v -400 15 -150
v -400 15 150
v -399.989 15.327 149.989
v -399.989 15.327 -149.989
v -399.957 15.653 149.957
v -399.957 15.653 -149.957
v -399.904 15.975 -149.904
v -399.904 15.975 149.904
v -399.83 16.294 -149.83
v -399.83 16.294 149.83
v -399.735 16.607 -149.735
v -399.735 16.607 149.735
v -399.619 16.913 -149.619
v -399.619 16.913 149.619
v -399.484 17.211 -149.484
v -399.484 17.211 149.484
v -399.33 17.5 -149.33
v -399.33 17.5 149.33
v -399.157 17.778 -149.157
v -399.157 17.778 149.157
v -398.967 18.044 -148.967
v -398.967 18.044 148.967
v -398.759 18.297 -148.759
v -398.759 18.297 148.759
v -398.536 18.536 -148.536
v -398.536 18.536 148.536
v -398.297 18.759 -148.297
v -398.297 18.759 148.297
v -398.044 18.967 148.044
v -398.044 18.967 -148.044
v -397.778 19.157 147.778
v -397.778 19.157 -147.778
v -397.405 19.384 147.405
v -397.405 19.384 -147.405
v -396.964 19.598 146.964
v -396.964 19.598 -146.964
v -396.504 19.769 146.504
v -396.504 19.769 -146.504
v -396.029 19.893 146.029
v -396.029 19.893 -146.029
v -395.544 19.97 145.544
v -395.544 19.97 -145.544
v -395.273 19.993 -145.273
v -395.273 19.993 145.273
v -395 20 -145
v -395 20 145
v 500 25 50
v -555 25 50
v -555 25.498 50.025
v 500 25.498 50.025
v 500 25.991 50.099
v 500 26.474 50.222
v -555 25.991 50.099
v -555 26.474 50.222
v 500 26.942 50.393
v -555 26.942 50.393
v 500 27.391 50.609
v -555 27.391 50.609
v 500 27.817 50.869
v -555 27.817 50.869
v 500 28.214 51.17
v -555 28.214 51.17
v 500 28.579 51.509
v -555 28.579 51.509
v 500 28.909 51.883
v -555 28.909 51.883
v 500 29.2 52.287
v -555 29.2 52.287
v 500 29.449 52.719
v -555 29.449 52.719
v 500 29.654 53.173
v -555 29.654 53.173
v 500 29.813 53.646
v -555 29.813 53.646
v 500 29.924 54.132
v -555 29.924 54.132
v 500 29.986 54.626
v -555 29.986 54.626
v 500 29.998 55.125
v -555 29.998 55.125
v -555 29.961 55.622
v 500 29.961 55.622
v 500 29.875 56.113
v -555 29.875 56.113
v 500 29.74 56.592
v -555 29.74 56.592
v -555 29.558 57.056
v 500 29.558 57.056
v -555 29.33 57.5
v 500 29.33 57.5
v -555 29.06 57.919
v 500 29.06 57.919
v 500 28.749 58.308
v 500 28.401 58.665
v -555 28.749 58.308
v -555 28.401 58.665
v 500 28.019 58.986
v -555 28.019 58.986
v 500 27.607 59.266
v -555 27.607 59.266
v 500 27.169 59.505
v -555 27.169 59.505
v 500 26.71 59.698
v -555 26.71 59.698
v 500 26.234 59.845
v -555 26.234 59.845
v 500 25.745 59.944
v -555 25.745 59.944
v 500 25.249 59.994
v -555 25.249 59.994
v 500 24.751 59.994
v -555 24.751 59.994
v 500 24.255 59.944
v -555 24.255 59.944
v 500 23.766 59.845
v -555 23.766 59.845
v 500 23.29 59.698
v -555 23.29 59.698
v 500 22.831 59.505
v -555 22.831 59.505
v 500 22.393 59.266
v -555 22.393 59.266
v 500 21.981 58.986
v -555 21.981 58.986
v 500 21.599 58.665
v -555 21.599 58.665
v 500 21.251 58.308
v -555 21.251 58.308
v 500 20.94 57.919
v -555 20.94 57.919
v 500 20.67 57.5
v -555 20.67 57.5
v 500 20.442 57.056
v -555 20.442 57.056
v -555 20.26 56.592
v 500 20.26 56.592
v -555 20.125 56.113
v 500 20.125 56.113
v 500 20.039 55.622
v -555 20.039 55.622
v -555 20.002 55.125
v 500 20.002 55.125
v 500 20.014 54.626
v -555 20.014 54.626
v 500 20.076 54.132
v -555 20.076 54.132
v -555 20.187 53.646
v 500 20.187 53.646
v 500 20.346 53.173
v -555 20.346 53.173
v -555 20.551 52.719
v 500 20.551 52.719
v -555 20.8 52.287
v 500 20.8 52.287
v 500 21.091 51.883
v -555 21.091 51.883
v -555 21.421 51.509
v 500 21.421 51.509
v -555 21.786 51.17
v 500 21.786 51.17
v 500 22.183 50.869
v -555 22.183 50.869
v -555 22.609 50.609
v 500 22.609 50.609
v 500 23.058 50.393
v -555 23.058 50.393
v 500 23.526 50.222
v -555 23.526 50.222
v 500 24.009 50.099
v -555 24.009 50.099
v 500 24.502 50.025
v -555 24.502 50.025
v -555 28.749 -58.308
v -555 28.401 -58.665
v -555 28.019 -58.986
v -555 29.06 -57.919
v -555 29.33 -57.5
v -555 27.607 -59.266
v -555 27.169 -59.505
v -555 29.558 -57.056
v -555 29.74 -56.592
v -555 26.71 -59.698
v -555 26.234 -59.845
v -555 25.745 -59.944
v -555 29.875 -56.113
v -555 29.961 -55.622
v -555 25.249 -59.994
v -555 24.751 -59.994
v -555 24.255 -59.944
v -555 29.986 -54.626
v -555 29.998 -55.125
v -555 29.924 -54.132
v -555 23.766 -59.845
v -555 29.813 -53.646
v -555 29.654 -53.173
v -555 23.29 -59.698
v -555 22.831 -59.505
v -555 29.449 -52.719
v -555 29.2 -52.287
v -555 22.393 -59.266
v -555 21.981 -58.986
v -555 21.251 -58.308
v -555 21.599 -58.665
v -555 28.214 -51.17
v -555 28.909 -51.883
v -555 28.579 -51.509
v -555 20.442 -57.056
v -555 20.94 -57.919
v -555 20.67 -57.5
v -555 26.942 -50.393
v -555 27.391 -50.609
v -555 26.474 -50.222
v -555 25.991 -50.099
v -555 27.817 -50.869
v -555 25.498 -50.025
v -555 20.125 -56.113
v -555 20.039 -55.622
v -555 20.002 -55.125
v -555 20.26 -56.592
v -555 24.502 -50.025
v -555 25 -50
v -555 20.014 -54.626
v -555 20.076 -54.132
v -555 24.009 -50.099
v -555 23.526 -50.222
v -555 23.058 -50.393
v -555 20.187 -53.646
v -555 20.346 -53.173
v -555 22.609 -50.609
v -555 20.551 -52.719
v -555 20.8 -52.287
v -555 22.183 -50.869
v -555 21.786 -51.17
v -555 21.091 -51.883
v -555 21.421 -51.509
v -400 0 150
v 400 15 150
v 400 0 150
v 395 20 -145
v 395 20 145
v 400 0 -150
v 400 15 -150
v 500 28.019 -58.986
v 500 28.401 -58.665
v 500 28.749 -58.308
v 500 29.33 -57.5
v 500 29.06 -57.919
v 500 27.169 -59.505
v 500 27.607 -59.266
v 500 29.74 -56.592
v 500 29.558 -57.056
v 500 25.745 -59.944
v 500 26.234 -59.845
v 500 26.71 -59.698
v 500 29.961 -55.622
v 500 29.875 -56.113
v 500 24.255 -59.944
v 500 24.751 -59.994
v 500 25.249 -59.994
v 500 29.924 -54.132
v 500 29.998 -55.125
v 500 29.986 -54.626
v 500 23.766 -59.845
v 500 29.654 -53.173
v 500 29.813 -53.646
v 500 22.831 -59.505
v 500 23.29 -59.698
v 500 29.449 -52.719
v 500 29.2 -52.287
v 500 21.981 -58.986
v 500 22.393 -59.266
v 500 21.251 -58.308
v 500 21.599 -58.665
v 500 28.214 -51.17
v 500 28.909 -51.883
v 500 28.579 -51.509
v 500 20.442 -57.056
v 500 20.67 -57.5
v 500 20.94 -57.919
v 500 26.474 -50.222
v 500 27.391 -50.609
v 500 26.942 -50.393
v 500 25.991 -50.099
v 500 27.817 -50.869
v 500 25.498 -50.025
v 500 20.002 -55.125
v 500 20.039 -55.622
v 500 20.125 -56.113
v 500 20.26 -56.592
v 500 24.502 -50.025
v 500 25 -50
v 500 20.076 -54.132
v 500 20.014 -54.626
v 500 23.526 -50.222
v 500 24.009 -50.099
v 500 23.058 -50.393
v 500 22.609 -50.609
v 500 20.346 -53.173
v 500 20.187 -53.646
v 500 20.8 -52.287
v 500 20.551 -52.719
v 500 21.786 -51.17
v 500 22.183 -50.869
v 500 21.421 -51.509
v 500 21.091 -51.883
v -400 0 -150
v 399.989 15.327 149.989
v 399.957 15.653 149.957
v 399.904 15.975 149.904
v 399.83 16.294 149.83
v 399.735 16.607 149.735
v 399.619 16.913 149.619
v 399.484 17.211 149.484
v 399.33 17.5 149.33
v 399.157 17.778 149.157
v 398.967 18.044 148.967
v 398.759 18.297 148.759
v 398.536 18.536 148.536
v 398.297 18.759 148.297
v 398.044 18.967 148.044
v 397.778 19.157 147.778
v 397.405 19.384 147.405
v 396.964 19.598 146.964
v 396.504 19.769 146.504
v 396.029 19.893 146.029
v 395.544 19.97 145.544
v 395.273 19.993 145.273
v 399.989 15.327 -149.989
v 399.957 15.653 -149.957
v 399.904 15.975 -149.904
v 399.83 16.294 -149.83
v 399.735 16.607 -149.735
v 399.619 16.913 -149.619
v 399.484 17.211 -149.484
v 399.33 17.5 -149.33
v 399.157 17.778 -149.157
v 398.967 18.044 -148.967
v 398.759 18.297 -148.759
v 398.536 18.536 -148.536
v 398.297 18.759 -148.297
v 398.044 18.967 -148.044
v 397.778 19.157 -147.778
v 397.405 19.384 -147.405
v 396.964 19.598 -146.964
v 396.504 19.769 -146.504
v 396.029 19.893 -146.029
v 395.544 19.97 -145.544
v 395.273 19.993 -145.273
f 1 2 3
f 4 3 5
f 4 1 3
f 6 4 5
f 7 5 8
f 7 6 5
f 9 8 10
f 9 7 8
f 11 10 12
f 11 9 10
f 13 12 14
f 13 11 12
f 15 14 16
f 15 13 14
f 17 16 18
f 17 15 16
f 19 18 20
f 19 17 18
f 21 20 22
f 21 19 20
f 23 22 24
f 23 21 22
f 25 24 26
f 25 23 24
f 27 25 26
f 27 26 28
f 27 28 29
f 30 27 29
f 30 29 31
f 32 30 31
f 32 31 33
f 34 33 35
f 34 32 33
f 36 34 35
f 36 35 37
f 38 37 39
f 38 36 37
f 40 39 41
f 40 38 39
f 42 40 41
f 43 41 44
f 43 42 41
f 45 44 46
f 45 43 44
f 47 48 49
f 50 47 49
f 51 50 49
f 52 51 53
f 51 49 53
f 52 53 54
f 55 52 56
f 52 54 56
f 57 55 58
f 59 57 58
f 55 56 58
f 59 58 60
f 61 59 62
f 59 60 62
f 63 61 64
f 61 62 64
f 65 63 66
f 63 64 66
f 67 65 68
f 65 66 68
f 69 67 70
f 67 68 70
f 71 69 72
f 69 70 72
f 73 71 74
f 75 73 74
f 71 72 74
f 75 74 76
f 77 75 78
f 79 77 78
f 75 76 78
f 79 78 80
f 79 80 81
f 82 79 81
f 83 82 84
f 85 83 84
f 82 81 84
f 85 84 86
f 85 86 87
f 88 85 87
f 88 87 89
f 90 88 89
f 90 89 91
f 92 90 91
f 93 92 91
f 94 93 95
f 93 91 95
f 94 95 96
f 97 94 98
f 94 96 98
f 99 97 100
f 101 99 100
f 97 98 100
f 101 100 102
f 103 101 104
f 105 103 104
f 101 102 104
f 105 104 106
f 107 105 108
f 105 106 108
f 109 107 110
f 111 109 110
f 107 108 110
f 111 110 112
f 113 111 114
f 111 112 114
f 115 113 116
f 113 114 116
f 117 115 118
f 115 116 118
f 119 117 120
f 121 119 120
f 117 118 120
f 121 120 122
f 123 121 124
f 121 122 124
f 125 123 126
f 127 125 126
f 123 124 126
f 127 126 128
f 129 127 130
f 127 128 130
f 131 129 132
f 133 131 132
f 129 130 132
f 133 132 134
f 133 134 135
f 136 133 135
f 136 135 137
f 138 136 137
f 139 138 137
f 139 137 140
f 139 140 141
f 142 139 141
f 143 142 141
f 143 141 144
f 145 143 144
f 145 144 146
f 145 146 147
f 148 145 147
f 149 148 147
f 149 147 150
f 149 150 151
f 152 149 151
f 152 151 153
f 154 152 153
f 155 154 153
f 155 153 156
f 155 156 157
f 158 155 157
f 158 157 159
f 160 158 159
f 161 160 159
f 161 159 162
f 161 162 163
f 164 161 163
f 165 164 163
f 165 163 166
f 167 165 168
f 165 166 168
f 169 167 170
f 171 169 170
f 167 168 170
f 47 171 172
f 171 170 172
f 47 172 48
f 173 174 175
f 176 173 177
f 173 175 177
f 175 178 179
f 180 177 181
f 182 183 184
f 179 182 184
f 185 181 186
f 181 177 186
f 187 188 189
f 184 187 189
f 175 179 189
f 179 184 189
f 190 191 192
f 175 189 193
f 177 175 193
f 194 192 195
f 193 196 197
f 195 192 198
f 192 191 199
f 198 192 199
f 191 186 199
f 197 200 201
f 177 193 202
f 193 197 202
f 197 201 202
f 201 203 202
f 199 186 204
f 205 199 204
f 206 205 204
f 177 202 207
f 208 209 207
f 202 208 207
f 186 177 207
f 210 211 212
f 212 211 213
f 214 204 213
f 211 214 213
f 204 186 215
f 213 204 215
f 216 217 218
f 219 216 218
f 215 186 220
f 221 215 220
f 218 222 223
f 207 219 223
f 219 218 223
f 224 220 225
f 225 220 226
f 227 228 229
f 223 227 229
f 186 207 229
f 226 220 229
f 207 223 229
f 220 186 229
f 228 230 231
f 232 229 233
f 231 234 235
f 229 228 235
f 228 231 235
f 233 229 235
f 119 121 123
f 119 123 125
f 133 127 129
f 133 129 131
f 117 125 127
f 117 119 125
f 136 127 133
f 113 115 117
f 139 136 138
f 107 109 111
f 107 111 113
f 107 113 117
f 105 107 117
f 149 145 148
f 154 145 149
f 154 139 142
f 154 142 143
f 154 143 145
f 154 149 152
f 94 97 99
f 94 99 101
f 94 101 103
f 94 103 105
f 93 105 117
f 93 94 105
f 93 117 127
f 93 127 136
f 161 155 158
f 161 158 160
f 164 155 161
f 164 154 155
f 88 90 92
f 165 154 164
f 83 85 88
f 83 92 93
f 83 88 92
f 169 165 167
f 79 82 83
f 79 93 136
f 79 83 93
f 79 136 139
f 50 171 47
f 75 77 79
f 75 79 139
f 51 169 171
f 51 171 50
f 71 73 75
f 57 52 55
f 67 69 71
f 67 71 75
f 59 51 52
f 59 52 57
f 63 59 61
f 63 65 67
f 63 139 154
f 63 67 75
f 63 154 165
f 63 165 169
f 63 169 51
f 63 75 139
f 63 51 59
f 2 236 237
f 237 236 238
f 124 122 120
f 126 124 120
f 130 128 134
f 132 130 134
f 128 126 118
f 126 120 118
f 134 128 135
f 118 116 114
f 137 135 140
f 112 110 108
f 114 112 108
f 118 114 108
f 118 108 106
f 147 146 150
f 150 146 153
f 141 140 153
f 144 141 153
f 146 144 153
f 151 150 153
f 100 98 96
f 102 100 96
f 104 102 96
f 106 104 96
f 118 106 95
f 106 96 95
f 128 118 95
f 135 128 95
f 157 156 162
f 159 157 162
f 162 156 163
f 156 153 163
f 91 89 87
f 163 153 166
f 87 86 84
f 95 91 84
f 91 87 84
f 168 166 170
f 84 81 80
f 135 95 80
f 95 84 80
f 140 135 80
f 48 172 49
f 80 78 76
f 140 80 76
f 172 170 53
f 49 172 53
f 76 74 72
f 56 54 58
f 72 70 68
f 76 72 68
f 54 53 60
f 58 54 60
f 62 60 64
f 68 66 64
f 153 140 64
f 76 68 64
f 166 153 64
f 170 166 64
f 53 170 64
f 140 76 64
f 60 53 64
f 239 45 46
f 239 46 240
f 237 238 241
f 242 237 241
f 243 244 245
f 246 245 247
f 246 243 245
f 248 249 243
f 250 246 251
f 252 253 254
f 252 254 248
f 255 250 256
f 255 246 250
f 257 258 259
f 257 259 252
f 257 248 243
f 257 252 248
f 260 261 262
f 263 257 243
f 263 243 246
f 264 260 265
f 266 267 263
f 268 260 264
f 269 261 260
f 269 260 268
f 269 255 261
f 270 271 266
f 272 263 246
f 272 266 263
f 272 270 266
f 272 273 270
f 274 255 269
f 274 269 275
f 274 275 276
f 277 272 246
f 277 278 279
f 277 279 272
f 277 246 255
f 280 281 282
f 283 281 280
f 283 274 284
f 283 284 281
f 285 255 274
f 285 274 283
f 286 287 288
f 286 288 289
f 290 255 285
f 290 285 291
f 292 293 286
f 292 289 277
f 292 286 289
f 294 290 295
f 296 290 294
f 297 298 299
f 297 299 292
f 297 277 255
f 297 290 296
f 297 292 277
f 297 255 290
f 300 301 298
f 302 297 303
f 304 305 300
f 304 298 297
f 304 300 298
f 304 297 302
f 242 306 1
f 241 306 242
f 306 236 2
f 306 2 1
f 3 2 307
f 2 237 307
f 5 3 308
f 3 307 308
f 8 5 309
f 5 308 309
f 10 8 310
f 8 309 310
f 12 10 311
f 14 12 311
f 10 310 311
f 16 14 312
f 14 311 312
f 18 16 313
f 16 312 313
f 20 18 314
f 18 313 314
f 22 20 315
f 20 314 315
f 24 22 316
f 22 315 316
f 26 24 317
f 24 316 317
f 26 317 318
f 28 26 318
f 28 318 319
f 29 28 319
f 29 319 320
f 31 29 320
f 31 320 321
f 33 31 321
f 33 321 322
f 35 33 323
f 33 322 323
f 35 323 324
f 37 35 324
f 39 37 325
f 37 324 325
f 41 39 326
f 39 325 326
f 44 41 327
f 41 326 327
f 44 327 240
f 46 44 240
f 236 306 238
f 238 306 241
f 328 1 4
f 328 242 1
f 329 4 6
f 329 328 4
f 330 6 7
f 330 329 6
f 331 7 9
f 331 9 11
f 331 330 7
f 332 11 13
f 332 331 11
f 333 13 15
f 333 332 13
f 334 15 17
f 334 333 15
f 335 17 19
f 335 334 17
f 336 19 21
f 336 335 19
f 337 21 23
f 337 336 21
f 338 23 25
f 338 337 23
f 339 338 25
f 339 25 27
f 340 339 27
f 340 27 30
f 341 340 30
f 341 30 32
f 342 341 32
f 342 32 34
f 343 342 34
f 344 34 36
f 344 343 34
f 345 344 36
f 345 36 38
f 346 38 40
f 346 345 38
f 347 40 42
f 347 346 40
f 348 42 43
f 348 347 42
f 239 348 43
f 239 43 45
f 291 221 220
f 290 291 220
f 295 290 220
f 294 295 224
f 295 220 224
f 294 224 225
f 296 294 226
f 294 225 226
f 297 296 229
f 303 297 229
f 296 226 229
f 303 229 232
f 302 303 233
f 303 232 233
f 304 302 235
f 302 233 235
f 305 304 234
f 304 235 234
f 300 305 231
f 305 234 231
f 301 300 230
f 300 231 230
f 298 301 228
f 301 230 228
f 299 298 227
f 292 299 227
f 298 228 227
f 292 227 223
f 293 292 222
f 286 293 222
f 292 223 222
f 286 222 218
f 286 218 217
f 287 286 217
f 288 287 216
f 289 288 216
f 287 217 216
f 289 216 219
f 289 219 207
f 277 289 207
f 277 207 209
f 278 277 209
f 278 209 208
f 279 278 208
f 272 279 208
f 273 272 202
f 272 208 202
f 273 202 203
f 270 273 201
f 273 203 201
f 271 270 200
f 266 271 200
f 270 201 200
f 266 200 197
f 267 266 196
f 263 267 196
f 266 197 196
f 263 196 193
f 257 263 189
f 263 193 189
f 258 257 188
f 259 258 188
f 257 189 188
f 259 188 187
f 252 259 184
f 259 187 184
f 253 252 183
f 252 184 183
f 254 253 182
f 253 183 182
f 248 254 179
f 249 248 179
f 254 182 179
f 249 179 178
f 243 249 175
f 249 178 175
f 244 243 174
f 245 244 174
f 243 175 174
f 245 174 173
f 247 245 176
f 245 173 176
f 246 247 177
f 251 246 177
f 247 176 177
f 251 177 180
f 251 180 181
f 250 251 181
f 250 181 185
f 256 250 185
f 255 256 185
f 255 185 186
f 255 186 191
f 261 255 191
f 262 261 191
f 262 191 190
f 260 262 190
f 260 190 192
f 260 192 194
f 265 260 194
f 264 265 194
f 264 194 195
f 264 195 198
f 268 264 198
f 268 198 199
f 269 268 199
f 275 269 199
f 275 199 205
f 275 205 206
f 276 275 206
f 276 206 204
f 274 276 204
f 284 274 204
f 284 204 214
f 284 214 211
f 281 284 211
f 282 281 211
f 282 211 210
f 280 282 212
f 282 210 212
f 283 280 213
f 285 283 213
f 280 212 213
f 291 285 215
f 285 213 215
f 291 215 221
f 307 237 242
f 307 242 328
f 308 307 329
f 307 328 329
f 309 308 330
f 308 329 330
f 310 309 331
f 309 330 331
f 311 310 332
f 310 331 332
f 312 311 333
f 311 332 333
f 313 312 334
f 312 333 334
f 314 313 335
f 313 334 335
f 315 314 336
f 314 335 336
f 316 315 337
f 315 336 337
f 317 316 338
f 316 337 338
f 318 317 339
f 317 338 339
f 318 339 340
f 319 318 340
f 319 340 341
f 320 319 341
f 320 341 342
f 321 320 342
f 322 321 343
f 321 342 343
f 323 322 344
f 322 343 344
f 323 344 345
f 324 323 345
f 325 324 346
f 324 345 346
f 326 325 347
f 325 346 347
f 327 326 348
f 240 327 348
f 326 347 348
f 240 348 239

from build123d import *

# Parameters (mm, degrees)
CROQUIS1_W            = 800
CROQUIS1_H            = 300
EXTRUIR1_DEPTH        = 20
REDONDEO1_R           = 5
EXTRUIR2_DEPTH        = 500
EXTRUIR2_DEPTH_BACK   = 555
CROQUIS2_R            = 5
EXTRUIR2_2_DEPTH      = 500
EXTRUIR2_2_DEPTH_BACK = 555


with BuildPart() as part:
    # Croquis1 → Extruir1 (new body)
    with BuildSketch(Plane(origin=(0, 0, 0), x_dir=(1, 0, 0), z_dir=(0, 1, 0))):
        Rectangle(CROQUIS1_W, CROQUIS1_H)
    extrude(amount=EXTRUIR1_DEPTH)

    # Redondeo1
    redondeo1_edges = [part.edges().sort_by_distance(p)[0] for p in [
        (400, 20, 0),
        (0, 20, -150),
        (-400, 20, 0),
        (0, 20, 150),
    ]]
    fillet(redondeo1_edges, radius=REDONDEO1_R)


with BuildPart() as body_2:
    # Croquis2 → Extruir2 (new, two sides: drawn at the far end of the back side and taken through both)
    with BuildSketch(Plane(origin=(0, 0, 0), x_dir=(0, 0, -1), z_dir=(1, 0, 0)).offset(-EXTRUIR2_DEPTH_BACK)):
        with Locations((-55, 25)):
            Circle(CROQUIS2_R)
    extrude(amount=EXTRUIR2_DEPTH + EXTRUIR2_DEPTH_BACK)


with BuildPart() as body_3:
    # Croquis2 → Extruir2 2 (new, two sides: drawn at the far end of the back side and taken through both)
    with BuildSketch(Plane(origin=(0, 0, 0), x_dir=(0, 0, -1), z_dir=(1, 0, 0)).offset(-EXTRUIR2_2_DEPTH_BACK)):
        with Locations(Location((55, 25, 0), (0, 0, 180))):
            Circle(CROQUIS2_R)
    extrude(amount=EXTRUIR2_2_DEPTH + EXTRUIR2_2_DEPTH_BACK)


solid = Compound([part.part, body_2.part, body_3.part])
